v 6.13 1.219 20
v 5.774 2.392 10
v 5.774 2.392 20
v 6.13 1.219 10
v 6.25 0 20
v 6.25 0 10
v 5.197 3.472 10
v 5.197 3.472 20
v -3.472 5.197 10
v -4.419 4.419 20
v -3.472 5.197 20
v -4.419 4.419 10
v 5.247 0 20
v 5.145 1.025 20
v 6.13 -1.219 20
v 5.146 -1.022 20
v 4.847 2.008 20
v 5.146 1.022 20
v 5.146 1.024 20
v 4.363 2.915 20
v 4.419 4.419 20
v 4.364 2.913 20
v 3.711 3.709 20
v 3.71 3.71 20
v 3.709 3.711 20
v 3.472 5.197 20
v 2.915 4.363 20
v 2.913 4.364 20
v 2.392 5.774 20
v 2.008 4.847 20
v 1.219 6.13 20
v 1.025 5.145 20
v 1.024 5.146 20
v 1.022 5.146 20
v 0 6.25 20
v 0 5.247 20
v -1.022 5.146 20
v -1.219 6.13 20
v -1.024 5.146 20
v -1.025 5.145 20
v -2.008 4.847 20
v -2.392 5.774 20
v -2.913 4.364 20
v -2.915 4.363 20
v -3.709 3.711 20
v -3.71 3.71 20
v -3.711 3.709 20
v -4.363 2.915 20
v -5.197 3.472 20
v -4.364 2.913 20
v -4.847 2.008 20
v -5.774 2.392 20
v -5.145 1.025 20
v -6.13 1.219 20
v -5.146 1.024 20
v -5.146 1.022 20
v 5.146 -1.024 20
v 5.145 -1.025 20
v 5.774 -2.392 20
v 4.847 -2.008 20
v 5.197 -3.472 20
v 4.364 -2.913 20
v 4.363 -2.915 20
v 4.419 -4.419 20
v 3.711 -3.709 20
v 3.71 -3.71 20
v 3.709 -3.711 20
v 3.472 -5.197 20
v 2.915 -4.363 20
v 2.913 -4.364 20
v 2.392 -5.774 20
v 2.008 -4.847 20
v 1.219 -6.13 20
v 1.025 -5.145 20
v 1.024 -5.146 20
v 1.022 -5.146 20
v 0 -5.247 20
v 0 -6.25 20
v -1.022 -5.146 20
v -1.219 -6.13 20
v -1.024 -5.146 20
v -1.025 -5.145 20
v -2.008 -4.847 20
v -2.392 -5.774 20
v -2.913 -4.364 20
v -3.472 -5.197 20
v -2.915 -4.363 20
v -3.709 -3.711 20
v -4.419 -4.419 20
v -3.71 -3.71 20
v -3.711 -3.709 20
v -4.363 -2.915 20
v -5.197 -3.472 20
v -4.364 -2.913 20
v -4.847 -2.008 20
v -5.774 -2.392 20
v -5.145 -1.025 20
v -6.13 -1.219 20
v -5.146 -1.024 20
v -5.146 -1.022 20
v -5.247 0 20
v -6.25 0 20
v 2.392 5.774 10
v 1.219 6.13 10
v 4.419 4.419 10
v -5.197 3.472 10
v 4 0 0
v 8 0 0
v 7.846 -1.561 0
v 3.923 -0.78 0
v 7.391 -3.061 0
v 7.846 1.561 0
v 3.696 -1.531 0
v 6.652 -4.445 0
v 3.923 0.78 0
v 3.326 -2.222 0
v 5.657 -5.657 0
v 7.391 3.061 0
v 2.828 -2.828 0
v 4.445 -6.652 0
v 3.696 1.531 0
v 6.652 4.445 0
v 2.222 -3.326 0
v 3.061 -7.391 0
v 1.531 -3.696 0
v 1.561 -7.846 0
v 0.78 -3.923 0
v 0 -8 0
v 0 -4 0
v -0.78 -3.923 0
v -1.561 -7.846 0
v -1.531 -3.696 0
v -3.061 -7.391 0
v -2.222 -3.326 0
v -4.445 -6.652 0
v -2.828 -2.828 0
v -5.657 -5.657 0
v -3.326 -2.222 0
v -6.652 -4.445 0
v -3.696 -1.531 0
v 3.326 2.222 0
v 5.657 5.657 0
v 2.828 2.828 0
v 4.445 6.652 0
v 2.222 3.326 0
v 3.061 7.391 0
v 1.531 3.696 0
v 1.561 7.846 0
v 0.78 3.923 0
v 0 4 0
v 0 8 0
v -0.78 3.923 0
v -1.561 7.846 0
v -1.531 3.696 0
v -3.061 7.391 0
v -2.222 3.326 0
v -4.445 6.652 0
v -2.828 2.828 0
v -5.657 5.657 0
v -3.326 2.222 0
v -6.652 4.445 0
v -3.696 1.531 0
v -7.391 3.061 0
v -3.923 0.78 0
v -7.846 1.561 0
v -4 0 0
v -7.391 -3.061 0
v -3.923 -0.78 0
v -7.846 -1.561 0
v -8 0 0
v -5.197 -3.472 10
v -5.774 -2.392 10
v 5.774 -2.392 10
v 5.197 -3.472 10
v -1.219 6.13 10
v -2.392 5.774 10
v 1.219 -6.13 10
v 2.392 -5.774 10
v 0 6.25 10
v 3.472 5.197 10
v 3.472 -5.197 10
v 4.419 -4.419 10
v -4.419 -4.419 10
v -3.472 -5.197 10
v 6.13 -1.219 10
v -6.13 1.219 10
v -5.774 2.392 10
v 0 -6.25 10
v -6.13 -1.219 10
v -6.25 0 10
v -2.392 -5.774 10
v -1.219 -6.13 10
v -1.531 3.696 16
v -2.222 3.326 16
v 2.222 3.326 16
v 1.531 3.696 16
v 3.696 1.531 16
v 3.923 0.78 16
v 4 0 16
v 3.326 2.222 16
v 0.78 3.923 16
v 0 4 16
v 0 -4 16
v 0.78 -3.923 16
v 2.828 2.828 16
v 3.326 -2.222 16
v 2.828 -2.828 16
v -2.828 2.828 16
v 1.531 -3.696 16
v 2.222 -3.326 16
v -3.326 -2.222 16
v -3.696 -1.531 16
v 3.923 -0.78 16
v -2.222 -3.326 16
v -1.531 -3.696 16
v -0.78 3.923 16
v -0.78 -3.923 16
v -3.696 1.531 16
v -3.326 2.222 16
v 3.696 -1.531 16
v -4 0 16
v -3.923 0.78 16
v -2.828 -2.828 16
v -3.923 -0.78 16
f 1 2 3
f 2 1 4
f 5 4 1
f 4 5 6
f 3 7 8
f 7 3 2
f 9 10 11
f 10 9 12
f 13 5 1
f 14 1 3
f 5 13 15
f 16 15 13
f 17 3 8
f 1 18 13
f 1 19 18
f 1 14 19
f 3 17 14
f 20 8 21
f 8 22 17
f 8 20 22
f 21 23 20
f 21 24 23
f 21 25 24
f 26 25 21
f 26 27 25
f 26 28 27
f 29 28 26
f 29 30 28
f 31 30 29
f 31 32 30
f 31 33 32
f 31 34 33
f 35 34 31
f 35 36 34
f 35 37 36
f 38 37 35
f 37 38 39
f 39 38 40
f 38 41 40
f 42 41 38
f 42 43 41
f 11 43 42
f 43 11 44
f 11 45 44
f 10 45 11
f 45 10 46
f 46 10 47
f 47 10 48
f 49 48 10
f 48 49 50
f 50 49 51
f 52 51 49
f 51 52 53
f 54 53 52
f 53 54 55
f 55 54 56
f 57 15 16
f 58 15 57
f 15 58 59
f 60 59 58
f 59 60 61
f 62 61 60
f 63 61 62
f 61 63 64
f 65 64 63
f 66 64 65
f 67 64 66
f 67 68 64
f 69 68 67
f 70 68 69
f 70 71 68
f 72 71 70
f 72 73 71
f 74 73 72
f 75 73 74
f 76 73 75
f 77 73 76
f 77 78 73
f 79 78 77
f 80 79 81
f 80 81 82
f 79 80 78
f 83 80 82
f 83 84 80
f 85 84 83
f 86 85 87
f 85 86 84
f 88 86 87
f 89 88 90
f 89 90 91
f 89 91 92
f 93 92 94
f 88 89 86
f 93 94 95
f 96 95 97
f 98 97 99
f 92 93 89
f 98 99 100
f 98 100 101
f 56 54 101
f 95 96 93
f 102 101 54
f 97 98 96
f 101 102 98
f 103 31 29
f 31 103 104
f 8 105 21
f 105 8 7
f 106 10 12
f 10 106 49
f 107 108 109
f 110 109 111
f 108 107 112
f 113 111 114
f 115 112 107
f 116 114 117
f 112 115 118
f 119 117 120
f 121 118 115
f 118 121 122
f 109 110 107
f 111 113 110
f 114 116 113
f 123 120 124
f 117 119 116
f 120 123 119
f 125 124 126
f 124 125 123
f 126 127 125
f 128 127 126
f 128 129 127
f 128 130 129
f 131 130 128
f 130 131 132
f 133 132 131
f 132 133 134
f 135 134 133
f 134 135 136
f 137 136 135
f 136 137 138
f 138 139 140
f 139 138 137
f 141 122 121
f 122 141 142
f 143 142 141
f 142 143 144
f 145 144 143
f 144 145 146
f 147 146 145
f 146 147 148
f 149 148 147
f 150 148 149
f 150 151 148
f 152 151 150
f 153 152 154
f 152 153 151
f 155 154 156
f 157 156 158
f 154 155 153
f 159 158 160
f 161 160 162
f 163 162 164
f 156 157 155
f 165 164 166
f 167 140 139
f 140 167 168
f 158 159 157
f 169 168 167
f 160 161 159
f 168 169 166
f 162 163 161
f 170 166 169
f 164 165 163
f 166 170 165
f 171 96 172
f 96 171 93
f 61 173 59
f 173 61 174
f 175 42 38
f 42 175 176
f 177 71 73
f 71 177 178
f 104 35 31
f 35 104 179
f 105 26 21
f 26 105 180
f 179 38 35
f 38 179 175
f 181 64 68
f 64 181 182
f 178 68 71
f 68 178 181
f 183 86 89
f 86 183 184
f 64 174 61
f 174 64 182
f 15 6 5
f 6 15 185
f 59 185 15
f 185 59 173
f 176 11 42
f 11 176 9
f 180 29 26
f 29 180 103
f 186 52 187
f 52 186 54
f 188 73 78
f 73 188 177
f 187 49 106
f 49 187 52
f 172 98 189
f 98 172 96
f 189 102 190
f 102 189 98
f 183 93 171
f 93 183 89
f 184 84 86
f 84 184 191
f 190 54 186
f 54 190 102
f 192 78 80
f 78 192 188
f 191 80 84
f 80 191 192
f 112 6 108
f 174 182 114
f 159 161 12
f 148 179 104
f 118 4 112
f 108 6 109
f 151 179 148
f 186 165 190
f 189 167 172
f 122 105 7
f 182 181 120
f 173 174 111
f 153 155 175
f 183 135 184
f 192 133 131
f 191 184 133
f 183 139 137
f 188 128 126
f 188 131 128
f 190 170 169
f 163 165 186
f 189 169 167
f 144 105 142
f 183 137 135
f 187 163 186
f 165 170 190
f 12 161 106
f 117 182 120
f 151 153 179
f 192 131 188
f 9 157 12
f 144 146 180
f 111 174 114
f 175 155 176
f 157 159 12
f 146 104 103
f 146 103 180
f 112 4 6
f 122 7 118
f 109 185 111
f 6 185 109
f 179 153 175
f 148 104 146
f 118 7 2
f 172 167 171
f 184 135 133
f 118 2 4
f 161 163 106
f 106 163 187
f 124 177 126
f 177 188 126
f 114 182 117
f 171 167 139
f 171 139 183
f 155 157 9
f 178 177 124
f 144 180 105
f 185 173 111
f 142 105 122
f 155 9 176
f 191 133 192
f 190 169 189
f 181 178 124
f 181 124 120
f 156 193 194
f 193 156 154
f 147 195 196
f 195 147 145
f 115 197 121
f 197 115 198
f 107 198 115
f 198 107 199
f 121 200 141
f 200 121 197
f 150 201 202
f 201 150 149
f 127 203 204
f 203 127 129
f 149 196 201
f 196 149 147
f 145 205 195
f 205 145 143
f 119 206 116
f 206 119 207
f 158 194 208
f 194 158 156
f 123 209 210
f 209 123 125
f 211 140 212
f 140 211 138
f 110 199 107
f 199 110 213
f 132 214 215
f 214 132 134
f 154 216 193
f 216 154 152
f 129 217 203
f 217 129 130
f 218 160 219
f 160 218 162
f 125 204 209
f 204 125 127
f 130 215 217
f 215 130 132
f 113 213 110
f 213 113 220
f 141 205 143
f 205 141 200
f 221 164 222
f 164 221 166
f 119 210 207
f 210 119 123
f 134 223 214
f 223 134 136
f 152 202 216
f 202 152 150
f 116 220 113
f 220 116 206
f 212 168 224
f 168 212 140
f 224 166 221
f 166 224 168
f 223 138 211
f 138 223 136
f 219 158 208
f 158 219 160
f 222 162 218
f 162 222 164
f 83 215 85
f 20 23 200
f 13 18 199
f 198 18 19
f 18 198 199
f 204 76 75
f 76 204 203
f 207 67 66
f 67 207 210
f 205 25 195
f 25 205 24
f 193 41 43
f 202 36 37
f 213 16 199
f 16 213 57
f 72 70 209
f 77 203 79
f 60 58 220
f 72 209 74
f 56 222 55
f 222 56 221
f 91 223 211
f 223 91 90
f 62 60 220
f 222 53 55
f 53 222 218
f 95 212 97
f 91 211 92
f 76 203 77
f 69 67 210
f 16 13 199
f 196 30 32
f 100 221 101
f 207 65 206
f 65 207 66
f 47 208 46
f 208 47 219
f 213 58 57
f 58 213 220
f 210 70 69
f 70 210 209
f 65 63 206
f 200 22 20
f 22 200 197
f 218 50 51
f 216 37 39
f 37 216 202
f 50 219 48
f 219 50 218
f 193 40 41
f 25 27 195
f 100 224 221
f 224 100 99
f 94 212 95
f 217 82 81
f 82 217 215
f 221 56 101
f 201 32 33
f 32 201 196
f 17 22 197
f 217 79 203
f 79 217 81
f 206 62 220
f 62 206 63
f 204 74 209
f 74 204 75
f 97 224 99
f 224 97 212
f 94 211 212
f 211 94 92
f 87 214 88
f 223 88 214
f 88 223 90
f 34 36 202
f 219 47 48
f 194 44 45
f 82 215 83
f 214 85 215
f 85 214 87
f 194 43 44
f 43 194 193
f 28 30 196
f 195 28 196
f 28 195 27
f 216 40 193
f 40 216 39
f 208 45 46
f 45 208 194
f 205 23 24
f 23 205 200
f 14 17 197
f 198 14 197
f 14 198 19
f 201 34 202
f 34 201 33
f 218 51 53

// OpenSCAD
// This is a trivial tool to support a 16mm lens as it is inserted
// into the holder.  Part of the OpenFlexure Microscope.

// (c) 2017 Richard Bowman, released under CERN open hardware license.

module lens_tool(h=20){
    $fn=32;

    difference(){
        union(){
            cylinder(d=12.5, h=h);
            cylinder(d1=16, d2=12.5, h=10);
        }
        // hollow it out
        cylinder(d=8, h=999, center=true);
        // bevel the top
        translate([0,0,h-4]) cylinder(d1=8, d2=10.5, h=4.01);
    }
}

lens_tool();
